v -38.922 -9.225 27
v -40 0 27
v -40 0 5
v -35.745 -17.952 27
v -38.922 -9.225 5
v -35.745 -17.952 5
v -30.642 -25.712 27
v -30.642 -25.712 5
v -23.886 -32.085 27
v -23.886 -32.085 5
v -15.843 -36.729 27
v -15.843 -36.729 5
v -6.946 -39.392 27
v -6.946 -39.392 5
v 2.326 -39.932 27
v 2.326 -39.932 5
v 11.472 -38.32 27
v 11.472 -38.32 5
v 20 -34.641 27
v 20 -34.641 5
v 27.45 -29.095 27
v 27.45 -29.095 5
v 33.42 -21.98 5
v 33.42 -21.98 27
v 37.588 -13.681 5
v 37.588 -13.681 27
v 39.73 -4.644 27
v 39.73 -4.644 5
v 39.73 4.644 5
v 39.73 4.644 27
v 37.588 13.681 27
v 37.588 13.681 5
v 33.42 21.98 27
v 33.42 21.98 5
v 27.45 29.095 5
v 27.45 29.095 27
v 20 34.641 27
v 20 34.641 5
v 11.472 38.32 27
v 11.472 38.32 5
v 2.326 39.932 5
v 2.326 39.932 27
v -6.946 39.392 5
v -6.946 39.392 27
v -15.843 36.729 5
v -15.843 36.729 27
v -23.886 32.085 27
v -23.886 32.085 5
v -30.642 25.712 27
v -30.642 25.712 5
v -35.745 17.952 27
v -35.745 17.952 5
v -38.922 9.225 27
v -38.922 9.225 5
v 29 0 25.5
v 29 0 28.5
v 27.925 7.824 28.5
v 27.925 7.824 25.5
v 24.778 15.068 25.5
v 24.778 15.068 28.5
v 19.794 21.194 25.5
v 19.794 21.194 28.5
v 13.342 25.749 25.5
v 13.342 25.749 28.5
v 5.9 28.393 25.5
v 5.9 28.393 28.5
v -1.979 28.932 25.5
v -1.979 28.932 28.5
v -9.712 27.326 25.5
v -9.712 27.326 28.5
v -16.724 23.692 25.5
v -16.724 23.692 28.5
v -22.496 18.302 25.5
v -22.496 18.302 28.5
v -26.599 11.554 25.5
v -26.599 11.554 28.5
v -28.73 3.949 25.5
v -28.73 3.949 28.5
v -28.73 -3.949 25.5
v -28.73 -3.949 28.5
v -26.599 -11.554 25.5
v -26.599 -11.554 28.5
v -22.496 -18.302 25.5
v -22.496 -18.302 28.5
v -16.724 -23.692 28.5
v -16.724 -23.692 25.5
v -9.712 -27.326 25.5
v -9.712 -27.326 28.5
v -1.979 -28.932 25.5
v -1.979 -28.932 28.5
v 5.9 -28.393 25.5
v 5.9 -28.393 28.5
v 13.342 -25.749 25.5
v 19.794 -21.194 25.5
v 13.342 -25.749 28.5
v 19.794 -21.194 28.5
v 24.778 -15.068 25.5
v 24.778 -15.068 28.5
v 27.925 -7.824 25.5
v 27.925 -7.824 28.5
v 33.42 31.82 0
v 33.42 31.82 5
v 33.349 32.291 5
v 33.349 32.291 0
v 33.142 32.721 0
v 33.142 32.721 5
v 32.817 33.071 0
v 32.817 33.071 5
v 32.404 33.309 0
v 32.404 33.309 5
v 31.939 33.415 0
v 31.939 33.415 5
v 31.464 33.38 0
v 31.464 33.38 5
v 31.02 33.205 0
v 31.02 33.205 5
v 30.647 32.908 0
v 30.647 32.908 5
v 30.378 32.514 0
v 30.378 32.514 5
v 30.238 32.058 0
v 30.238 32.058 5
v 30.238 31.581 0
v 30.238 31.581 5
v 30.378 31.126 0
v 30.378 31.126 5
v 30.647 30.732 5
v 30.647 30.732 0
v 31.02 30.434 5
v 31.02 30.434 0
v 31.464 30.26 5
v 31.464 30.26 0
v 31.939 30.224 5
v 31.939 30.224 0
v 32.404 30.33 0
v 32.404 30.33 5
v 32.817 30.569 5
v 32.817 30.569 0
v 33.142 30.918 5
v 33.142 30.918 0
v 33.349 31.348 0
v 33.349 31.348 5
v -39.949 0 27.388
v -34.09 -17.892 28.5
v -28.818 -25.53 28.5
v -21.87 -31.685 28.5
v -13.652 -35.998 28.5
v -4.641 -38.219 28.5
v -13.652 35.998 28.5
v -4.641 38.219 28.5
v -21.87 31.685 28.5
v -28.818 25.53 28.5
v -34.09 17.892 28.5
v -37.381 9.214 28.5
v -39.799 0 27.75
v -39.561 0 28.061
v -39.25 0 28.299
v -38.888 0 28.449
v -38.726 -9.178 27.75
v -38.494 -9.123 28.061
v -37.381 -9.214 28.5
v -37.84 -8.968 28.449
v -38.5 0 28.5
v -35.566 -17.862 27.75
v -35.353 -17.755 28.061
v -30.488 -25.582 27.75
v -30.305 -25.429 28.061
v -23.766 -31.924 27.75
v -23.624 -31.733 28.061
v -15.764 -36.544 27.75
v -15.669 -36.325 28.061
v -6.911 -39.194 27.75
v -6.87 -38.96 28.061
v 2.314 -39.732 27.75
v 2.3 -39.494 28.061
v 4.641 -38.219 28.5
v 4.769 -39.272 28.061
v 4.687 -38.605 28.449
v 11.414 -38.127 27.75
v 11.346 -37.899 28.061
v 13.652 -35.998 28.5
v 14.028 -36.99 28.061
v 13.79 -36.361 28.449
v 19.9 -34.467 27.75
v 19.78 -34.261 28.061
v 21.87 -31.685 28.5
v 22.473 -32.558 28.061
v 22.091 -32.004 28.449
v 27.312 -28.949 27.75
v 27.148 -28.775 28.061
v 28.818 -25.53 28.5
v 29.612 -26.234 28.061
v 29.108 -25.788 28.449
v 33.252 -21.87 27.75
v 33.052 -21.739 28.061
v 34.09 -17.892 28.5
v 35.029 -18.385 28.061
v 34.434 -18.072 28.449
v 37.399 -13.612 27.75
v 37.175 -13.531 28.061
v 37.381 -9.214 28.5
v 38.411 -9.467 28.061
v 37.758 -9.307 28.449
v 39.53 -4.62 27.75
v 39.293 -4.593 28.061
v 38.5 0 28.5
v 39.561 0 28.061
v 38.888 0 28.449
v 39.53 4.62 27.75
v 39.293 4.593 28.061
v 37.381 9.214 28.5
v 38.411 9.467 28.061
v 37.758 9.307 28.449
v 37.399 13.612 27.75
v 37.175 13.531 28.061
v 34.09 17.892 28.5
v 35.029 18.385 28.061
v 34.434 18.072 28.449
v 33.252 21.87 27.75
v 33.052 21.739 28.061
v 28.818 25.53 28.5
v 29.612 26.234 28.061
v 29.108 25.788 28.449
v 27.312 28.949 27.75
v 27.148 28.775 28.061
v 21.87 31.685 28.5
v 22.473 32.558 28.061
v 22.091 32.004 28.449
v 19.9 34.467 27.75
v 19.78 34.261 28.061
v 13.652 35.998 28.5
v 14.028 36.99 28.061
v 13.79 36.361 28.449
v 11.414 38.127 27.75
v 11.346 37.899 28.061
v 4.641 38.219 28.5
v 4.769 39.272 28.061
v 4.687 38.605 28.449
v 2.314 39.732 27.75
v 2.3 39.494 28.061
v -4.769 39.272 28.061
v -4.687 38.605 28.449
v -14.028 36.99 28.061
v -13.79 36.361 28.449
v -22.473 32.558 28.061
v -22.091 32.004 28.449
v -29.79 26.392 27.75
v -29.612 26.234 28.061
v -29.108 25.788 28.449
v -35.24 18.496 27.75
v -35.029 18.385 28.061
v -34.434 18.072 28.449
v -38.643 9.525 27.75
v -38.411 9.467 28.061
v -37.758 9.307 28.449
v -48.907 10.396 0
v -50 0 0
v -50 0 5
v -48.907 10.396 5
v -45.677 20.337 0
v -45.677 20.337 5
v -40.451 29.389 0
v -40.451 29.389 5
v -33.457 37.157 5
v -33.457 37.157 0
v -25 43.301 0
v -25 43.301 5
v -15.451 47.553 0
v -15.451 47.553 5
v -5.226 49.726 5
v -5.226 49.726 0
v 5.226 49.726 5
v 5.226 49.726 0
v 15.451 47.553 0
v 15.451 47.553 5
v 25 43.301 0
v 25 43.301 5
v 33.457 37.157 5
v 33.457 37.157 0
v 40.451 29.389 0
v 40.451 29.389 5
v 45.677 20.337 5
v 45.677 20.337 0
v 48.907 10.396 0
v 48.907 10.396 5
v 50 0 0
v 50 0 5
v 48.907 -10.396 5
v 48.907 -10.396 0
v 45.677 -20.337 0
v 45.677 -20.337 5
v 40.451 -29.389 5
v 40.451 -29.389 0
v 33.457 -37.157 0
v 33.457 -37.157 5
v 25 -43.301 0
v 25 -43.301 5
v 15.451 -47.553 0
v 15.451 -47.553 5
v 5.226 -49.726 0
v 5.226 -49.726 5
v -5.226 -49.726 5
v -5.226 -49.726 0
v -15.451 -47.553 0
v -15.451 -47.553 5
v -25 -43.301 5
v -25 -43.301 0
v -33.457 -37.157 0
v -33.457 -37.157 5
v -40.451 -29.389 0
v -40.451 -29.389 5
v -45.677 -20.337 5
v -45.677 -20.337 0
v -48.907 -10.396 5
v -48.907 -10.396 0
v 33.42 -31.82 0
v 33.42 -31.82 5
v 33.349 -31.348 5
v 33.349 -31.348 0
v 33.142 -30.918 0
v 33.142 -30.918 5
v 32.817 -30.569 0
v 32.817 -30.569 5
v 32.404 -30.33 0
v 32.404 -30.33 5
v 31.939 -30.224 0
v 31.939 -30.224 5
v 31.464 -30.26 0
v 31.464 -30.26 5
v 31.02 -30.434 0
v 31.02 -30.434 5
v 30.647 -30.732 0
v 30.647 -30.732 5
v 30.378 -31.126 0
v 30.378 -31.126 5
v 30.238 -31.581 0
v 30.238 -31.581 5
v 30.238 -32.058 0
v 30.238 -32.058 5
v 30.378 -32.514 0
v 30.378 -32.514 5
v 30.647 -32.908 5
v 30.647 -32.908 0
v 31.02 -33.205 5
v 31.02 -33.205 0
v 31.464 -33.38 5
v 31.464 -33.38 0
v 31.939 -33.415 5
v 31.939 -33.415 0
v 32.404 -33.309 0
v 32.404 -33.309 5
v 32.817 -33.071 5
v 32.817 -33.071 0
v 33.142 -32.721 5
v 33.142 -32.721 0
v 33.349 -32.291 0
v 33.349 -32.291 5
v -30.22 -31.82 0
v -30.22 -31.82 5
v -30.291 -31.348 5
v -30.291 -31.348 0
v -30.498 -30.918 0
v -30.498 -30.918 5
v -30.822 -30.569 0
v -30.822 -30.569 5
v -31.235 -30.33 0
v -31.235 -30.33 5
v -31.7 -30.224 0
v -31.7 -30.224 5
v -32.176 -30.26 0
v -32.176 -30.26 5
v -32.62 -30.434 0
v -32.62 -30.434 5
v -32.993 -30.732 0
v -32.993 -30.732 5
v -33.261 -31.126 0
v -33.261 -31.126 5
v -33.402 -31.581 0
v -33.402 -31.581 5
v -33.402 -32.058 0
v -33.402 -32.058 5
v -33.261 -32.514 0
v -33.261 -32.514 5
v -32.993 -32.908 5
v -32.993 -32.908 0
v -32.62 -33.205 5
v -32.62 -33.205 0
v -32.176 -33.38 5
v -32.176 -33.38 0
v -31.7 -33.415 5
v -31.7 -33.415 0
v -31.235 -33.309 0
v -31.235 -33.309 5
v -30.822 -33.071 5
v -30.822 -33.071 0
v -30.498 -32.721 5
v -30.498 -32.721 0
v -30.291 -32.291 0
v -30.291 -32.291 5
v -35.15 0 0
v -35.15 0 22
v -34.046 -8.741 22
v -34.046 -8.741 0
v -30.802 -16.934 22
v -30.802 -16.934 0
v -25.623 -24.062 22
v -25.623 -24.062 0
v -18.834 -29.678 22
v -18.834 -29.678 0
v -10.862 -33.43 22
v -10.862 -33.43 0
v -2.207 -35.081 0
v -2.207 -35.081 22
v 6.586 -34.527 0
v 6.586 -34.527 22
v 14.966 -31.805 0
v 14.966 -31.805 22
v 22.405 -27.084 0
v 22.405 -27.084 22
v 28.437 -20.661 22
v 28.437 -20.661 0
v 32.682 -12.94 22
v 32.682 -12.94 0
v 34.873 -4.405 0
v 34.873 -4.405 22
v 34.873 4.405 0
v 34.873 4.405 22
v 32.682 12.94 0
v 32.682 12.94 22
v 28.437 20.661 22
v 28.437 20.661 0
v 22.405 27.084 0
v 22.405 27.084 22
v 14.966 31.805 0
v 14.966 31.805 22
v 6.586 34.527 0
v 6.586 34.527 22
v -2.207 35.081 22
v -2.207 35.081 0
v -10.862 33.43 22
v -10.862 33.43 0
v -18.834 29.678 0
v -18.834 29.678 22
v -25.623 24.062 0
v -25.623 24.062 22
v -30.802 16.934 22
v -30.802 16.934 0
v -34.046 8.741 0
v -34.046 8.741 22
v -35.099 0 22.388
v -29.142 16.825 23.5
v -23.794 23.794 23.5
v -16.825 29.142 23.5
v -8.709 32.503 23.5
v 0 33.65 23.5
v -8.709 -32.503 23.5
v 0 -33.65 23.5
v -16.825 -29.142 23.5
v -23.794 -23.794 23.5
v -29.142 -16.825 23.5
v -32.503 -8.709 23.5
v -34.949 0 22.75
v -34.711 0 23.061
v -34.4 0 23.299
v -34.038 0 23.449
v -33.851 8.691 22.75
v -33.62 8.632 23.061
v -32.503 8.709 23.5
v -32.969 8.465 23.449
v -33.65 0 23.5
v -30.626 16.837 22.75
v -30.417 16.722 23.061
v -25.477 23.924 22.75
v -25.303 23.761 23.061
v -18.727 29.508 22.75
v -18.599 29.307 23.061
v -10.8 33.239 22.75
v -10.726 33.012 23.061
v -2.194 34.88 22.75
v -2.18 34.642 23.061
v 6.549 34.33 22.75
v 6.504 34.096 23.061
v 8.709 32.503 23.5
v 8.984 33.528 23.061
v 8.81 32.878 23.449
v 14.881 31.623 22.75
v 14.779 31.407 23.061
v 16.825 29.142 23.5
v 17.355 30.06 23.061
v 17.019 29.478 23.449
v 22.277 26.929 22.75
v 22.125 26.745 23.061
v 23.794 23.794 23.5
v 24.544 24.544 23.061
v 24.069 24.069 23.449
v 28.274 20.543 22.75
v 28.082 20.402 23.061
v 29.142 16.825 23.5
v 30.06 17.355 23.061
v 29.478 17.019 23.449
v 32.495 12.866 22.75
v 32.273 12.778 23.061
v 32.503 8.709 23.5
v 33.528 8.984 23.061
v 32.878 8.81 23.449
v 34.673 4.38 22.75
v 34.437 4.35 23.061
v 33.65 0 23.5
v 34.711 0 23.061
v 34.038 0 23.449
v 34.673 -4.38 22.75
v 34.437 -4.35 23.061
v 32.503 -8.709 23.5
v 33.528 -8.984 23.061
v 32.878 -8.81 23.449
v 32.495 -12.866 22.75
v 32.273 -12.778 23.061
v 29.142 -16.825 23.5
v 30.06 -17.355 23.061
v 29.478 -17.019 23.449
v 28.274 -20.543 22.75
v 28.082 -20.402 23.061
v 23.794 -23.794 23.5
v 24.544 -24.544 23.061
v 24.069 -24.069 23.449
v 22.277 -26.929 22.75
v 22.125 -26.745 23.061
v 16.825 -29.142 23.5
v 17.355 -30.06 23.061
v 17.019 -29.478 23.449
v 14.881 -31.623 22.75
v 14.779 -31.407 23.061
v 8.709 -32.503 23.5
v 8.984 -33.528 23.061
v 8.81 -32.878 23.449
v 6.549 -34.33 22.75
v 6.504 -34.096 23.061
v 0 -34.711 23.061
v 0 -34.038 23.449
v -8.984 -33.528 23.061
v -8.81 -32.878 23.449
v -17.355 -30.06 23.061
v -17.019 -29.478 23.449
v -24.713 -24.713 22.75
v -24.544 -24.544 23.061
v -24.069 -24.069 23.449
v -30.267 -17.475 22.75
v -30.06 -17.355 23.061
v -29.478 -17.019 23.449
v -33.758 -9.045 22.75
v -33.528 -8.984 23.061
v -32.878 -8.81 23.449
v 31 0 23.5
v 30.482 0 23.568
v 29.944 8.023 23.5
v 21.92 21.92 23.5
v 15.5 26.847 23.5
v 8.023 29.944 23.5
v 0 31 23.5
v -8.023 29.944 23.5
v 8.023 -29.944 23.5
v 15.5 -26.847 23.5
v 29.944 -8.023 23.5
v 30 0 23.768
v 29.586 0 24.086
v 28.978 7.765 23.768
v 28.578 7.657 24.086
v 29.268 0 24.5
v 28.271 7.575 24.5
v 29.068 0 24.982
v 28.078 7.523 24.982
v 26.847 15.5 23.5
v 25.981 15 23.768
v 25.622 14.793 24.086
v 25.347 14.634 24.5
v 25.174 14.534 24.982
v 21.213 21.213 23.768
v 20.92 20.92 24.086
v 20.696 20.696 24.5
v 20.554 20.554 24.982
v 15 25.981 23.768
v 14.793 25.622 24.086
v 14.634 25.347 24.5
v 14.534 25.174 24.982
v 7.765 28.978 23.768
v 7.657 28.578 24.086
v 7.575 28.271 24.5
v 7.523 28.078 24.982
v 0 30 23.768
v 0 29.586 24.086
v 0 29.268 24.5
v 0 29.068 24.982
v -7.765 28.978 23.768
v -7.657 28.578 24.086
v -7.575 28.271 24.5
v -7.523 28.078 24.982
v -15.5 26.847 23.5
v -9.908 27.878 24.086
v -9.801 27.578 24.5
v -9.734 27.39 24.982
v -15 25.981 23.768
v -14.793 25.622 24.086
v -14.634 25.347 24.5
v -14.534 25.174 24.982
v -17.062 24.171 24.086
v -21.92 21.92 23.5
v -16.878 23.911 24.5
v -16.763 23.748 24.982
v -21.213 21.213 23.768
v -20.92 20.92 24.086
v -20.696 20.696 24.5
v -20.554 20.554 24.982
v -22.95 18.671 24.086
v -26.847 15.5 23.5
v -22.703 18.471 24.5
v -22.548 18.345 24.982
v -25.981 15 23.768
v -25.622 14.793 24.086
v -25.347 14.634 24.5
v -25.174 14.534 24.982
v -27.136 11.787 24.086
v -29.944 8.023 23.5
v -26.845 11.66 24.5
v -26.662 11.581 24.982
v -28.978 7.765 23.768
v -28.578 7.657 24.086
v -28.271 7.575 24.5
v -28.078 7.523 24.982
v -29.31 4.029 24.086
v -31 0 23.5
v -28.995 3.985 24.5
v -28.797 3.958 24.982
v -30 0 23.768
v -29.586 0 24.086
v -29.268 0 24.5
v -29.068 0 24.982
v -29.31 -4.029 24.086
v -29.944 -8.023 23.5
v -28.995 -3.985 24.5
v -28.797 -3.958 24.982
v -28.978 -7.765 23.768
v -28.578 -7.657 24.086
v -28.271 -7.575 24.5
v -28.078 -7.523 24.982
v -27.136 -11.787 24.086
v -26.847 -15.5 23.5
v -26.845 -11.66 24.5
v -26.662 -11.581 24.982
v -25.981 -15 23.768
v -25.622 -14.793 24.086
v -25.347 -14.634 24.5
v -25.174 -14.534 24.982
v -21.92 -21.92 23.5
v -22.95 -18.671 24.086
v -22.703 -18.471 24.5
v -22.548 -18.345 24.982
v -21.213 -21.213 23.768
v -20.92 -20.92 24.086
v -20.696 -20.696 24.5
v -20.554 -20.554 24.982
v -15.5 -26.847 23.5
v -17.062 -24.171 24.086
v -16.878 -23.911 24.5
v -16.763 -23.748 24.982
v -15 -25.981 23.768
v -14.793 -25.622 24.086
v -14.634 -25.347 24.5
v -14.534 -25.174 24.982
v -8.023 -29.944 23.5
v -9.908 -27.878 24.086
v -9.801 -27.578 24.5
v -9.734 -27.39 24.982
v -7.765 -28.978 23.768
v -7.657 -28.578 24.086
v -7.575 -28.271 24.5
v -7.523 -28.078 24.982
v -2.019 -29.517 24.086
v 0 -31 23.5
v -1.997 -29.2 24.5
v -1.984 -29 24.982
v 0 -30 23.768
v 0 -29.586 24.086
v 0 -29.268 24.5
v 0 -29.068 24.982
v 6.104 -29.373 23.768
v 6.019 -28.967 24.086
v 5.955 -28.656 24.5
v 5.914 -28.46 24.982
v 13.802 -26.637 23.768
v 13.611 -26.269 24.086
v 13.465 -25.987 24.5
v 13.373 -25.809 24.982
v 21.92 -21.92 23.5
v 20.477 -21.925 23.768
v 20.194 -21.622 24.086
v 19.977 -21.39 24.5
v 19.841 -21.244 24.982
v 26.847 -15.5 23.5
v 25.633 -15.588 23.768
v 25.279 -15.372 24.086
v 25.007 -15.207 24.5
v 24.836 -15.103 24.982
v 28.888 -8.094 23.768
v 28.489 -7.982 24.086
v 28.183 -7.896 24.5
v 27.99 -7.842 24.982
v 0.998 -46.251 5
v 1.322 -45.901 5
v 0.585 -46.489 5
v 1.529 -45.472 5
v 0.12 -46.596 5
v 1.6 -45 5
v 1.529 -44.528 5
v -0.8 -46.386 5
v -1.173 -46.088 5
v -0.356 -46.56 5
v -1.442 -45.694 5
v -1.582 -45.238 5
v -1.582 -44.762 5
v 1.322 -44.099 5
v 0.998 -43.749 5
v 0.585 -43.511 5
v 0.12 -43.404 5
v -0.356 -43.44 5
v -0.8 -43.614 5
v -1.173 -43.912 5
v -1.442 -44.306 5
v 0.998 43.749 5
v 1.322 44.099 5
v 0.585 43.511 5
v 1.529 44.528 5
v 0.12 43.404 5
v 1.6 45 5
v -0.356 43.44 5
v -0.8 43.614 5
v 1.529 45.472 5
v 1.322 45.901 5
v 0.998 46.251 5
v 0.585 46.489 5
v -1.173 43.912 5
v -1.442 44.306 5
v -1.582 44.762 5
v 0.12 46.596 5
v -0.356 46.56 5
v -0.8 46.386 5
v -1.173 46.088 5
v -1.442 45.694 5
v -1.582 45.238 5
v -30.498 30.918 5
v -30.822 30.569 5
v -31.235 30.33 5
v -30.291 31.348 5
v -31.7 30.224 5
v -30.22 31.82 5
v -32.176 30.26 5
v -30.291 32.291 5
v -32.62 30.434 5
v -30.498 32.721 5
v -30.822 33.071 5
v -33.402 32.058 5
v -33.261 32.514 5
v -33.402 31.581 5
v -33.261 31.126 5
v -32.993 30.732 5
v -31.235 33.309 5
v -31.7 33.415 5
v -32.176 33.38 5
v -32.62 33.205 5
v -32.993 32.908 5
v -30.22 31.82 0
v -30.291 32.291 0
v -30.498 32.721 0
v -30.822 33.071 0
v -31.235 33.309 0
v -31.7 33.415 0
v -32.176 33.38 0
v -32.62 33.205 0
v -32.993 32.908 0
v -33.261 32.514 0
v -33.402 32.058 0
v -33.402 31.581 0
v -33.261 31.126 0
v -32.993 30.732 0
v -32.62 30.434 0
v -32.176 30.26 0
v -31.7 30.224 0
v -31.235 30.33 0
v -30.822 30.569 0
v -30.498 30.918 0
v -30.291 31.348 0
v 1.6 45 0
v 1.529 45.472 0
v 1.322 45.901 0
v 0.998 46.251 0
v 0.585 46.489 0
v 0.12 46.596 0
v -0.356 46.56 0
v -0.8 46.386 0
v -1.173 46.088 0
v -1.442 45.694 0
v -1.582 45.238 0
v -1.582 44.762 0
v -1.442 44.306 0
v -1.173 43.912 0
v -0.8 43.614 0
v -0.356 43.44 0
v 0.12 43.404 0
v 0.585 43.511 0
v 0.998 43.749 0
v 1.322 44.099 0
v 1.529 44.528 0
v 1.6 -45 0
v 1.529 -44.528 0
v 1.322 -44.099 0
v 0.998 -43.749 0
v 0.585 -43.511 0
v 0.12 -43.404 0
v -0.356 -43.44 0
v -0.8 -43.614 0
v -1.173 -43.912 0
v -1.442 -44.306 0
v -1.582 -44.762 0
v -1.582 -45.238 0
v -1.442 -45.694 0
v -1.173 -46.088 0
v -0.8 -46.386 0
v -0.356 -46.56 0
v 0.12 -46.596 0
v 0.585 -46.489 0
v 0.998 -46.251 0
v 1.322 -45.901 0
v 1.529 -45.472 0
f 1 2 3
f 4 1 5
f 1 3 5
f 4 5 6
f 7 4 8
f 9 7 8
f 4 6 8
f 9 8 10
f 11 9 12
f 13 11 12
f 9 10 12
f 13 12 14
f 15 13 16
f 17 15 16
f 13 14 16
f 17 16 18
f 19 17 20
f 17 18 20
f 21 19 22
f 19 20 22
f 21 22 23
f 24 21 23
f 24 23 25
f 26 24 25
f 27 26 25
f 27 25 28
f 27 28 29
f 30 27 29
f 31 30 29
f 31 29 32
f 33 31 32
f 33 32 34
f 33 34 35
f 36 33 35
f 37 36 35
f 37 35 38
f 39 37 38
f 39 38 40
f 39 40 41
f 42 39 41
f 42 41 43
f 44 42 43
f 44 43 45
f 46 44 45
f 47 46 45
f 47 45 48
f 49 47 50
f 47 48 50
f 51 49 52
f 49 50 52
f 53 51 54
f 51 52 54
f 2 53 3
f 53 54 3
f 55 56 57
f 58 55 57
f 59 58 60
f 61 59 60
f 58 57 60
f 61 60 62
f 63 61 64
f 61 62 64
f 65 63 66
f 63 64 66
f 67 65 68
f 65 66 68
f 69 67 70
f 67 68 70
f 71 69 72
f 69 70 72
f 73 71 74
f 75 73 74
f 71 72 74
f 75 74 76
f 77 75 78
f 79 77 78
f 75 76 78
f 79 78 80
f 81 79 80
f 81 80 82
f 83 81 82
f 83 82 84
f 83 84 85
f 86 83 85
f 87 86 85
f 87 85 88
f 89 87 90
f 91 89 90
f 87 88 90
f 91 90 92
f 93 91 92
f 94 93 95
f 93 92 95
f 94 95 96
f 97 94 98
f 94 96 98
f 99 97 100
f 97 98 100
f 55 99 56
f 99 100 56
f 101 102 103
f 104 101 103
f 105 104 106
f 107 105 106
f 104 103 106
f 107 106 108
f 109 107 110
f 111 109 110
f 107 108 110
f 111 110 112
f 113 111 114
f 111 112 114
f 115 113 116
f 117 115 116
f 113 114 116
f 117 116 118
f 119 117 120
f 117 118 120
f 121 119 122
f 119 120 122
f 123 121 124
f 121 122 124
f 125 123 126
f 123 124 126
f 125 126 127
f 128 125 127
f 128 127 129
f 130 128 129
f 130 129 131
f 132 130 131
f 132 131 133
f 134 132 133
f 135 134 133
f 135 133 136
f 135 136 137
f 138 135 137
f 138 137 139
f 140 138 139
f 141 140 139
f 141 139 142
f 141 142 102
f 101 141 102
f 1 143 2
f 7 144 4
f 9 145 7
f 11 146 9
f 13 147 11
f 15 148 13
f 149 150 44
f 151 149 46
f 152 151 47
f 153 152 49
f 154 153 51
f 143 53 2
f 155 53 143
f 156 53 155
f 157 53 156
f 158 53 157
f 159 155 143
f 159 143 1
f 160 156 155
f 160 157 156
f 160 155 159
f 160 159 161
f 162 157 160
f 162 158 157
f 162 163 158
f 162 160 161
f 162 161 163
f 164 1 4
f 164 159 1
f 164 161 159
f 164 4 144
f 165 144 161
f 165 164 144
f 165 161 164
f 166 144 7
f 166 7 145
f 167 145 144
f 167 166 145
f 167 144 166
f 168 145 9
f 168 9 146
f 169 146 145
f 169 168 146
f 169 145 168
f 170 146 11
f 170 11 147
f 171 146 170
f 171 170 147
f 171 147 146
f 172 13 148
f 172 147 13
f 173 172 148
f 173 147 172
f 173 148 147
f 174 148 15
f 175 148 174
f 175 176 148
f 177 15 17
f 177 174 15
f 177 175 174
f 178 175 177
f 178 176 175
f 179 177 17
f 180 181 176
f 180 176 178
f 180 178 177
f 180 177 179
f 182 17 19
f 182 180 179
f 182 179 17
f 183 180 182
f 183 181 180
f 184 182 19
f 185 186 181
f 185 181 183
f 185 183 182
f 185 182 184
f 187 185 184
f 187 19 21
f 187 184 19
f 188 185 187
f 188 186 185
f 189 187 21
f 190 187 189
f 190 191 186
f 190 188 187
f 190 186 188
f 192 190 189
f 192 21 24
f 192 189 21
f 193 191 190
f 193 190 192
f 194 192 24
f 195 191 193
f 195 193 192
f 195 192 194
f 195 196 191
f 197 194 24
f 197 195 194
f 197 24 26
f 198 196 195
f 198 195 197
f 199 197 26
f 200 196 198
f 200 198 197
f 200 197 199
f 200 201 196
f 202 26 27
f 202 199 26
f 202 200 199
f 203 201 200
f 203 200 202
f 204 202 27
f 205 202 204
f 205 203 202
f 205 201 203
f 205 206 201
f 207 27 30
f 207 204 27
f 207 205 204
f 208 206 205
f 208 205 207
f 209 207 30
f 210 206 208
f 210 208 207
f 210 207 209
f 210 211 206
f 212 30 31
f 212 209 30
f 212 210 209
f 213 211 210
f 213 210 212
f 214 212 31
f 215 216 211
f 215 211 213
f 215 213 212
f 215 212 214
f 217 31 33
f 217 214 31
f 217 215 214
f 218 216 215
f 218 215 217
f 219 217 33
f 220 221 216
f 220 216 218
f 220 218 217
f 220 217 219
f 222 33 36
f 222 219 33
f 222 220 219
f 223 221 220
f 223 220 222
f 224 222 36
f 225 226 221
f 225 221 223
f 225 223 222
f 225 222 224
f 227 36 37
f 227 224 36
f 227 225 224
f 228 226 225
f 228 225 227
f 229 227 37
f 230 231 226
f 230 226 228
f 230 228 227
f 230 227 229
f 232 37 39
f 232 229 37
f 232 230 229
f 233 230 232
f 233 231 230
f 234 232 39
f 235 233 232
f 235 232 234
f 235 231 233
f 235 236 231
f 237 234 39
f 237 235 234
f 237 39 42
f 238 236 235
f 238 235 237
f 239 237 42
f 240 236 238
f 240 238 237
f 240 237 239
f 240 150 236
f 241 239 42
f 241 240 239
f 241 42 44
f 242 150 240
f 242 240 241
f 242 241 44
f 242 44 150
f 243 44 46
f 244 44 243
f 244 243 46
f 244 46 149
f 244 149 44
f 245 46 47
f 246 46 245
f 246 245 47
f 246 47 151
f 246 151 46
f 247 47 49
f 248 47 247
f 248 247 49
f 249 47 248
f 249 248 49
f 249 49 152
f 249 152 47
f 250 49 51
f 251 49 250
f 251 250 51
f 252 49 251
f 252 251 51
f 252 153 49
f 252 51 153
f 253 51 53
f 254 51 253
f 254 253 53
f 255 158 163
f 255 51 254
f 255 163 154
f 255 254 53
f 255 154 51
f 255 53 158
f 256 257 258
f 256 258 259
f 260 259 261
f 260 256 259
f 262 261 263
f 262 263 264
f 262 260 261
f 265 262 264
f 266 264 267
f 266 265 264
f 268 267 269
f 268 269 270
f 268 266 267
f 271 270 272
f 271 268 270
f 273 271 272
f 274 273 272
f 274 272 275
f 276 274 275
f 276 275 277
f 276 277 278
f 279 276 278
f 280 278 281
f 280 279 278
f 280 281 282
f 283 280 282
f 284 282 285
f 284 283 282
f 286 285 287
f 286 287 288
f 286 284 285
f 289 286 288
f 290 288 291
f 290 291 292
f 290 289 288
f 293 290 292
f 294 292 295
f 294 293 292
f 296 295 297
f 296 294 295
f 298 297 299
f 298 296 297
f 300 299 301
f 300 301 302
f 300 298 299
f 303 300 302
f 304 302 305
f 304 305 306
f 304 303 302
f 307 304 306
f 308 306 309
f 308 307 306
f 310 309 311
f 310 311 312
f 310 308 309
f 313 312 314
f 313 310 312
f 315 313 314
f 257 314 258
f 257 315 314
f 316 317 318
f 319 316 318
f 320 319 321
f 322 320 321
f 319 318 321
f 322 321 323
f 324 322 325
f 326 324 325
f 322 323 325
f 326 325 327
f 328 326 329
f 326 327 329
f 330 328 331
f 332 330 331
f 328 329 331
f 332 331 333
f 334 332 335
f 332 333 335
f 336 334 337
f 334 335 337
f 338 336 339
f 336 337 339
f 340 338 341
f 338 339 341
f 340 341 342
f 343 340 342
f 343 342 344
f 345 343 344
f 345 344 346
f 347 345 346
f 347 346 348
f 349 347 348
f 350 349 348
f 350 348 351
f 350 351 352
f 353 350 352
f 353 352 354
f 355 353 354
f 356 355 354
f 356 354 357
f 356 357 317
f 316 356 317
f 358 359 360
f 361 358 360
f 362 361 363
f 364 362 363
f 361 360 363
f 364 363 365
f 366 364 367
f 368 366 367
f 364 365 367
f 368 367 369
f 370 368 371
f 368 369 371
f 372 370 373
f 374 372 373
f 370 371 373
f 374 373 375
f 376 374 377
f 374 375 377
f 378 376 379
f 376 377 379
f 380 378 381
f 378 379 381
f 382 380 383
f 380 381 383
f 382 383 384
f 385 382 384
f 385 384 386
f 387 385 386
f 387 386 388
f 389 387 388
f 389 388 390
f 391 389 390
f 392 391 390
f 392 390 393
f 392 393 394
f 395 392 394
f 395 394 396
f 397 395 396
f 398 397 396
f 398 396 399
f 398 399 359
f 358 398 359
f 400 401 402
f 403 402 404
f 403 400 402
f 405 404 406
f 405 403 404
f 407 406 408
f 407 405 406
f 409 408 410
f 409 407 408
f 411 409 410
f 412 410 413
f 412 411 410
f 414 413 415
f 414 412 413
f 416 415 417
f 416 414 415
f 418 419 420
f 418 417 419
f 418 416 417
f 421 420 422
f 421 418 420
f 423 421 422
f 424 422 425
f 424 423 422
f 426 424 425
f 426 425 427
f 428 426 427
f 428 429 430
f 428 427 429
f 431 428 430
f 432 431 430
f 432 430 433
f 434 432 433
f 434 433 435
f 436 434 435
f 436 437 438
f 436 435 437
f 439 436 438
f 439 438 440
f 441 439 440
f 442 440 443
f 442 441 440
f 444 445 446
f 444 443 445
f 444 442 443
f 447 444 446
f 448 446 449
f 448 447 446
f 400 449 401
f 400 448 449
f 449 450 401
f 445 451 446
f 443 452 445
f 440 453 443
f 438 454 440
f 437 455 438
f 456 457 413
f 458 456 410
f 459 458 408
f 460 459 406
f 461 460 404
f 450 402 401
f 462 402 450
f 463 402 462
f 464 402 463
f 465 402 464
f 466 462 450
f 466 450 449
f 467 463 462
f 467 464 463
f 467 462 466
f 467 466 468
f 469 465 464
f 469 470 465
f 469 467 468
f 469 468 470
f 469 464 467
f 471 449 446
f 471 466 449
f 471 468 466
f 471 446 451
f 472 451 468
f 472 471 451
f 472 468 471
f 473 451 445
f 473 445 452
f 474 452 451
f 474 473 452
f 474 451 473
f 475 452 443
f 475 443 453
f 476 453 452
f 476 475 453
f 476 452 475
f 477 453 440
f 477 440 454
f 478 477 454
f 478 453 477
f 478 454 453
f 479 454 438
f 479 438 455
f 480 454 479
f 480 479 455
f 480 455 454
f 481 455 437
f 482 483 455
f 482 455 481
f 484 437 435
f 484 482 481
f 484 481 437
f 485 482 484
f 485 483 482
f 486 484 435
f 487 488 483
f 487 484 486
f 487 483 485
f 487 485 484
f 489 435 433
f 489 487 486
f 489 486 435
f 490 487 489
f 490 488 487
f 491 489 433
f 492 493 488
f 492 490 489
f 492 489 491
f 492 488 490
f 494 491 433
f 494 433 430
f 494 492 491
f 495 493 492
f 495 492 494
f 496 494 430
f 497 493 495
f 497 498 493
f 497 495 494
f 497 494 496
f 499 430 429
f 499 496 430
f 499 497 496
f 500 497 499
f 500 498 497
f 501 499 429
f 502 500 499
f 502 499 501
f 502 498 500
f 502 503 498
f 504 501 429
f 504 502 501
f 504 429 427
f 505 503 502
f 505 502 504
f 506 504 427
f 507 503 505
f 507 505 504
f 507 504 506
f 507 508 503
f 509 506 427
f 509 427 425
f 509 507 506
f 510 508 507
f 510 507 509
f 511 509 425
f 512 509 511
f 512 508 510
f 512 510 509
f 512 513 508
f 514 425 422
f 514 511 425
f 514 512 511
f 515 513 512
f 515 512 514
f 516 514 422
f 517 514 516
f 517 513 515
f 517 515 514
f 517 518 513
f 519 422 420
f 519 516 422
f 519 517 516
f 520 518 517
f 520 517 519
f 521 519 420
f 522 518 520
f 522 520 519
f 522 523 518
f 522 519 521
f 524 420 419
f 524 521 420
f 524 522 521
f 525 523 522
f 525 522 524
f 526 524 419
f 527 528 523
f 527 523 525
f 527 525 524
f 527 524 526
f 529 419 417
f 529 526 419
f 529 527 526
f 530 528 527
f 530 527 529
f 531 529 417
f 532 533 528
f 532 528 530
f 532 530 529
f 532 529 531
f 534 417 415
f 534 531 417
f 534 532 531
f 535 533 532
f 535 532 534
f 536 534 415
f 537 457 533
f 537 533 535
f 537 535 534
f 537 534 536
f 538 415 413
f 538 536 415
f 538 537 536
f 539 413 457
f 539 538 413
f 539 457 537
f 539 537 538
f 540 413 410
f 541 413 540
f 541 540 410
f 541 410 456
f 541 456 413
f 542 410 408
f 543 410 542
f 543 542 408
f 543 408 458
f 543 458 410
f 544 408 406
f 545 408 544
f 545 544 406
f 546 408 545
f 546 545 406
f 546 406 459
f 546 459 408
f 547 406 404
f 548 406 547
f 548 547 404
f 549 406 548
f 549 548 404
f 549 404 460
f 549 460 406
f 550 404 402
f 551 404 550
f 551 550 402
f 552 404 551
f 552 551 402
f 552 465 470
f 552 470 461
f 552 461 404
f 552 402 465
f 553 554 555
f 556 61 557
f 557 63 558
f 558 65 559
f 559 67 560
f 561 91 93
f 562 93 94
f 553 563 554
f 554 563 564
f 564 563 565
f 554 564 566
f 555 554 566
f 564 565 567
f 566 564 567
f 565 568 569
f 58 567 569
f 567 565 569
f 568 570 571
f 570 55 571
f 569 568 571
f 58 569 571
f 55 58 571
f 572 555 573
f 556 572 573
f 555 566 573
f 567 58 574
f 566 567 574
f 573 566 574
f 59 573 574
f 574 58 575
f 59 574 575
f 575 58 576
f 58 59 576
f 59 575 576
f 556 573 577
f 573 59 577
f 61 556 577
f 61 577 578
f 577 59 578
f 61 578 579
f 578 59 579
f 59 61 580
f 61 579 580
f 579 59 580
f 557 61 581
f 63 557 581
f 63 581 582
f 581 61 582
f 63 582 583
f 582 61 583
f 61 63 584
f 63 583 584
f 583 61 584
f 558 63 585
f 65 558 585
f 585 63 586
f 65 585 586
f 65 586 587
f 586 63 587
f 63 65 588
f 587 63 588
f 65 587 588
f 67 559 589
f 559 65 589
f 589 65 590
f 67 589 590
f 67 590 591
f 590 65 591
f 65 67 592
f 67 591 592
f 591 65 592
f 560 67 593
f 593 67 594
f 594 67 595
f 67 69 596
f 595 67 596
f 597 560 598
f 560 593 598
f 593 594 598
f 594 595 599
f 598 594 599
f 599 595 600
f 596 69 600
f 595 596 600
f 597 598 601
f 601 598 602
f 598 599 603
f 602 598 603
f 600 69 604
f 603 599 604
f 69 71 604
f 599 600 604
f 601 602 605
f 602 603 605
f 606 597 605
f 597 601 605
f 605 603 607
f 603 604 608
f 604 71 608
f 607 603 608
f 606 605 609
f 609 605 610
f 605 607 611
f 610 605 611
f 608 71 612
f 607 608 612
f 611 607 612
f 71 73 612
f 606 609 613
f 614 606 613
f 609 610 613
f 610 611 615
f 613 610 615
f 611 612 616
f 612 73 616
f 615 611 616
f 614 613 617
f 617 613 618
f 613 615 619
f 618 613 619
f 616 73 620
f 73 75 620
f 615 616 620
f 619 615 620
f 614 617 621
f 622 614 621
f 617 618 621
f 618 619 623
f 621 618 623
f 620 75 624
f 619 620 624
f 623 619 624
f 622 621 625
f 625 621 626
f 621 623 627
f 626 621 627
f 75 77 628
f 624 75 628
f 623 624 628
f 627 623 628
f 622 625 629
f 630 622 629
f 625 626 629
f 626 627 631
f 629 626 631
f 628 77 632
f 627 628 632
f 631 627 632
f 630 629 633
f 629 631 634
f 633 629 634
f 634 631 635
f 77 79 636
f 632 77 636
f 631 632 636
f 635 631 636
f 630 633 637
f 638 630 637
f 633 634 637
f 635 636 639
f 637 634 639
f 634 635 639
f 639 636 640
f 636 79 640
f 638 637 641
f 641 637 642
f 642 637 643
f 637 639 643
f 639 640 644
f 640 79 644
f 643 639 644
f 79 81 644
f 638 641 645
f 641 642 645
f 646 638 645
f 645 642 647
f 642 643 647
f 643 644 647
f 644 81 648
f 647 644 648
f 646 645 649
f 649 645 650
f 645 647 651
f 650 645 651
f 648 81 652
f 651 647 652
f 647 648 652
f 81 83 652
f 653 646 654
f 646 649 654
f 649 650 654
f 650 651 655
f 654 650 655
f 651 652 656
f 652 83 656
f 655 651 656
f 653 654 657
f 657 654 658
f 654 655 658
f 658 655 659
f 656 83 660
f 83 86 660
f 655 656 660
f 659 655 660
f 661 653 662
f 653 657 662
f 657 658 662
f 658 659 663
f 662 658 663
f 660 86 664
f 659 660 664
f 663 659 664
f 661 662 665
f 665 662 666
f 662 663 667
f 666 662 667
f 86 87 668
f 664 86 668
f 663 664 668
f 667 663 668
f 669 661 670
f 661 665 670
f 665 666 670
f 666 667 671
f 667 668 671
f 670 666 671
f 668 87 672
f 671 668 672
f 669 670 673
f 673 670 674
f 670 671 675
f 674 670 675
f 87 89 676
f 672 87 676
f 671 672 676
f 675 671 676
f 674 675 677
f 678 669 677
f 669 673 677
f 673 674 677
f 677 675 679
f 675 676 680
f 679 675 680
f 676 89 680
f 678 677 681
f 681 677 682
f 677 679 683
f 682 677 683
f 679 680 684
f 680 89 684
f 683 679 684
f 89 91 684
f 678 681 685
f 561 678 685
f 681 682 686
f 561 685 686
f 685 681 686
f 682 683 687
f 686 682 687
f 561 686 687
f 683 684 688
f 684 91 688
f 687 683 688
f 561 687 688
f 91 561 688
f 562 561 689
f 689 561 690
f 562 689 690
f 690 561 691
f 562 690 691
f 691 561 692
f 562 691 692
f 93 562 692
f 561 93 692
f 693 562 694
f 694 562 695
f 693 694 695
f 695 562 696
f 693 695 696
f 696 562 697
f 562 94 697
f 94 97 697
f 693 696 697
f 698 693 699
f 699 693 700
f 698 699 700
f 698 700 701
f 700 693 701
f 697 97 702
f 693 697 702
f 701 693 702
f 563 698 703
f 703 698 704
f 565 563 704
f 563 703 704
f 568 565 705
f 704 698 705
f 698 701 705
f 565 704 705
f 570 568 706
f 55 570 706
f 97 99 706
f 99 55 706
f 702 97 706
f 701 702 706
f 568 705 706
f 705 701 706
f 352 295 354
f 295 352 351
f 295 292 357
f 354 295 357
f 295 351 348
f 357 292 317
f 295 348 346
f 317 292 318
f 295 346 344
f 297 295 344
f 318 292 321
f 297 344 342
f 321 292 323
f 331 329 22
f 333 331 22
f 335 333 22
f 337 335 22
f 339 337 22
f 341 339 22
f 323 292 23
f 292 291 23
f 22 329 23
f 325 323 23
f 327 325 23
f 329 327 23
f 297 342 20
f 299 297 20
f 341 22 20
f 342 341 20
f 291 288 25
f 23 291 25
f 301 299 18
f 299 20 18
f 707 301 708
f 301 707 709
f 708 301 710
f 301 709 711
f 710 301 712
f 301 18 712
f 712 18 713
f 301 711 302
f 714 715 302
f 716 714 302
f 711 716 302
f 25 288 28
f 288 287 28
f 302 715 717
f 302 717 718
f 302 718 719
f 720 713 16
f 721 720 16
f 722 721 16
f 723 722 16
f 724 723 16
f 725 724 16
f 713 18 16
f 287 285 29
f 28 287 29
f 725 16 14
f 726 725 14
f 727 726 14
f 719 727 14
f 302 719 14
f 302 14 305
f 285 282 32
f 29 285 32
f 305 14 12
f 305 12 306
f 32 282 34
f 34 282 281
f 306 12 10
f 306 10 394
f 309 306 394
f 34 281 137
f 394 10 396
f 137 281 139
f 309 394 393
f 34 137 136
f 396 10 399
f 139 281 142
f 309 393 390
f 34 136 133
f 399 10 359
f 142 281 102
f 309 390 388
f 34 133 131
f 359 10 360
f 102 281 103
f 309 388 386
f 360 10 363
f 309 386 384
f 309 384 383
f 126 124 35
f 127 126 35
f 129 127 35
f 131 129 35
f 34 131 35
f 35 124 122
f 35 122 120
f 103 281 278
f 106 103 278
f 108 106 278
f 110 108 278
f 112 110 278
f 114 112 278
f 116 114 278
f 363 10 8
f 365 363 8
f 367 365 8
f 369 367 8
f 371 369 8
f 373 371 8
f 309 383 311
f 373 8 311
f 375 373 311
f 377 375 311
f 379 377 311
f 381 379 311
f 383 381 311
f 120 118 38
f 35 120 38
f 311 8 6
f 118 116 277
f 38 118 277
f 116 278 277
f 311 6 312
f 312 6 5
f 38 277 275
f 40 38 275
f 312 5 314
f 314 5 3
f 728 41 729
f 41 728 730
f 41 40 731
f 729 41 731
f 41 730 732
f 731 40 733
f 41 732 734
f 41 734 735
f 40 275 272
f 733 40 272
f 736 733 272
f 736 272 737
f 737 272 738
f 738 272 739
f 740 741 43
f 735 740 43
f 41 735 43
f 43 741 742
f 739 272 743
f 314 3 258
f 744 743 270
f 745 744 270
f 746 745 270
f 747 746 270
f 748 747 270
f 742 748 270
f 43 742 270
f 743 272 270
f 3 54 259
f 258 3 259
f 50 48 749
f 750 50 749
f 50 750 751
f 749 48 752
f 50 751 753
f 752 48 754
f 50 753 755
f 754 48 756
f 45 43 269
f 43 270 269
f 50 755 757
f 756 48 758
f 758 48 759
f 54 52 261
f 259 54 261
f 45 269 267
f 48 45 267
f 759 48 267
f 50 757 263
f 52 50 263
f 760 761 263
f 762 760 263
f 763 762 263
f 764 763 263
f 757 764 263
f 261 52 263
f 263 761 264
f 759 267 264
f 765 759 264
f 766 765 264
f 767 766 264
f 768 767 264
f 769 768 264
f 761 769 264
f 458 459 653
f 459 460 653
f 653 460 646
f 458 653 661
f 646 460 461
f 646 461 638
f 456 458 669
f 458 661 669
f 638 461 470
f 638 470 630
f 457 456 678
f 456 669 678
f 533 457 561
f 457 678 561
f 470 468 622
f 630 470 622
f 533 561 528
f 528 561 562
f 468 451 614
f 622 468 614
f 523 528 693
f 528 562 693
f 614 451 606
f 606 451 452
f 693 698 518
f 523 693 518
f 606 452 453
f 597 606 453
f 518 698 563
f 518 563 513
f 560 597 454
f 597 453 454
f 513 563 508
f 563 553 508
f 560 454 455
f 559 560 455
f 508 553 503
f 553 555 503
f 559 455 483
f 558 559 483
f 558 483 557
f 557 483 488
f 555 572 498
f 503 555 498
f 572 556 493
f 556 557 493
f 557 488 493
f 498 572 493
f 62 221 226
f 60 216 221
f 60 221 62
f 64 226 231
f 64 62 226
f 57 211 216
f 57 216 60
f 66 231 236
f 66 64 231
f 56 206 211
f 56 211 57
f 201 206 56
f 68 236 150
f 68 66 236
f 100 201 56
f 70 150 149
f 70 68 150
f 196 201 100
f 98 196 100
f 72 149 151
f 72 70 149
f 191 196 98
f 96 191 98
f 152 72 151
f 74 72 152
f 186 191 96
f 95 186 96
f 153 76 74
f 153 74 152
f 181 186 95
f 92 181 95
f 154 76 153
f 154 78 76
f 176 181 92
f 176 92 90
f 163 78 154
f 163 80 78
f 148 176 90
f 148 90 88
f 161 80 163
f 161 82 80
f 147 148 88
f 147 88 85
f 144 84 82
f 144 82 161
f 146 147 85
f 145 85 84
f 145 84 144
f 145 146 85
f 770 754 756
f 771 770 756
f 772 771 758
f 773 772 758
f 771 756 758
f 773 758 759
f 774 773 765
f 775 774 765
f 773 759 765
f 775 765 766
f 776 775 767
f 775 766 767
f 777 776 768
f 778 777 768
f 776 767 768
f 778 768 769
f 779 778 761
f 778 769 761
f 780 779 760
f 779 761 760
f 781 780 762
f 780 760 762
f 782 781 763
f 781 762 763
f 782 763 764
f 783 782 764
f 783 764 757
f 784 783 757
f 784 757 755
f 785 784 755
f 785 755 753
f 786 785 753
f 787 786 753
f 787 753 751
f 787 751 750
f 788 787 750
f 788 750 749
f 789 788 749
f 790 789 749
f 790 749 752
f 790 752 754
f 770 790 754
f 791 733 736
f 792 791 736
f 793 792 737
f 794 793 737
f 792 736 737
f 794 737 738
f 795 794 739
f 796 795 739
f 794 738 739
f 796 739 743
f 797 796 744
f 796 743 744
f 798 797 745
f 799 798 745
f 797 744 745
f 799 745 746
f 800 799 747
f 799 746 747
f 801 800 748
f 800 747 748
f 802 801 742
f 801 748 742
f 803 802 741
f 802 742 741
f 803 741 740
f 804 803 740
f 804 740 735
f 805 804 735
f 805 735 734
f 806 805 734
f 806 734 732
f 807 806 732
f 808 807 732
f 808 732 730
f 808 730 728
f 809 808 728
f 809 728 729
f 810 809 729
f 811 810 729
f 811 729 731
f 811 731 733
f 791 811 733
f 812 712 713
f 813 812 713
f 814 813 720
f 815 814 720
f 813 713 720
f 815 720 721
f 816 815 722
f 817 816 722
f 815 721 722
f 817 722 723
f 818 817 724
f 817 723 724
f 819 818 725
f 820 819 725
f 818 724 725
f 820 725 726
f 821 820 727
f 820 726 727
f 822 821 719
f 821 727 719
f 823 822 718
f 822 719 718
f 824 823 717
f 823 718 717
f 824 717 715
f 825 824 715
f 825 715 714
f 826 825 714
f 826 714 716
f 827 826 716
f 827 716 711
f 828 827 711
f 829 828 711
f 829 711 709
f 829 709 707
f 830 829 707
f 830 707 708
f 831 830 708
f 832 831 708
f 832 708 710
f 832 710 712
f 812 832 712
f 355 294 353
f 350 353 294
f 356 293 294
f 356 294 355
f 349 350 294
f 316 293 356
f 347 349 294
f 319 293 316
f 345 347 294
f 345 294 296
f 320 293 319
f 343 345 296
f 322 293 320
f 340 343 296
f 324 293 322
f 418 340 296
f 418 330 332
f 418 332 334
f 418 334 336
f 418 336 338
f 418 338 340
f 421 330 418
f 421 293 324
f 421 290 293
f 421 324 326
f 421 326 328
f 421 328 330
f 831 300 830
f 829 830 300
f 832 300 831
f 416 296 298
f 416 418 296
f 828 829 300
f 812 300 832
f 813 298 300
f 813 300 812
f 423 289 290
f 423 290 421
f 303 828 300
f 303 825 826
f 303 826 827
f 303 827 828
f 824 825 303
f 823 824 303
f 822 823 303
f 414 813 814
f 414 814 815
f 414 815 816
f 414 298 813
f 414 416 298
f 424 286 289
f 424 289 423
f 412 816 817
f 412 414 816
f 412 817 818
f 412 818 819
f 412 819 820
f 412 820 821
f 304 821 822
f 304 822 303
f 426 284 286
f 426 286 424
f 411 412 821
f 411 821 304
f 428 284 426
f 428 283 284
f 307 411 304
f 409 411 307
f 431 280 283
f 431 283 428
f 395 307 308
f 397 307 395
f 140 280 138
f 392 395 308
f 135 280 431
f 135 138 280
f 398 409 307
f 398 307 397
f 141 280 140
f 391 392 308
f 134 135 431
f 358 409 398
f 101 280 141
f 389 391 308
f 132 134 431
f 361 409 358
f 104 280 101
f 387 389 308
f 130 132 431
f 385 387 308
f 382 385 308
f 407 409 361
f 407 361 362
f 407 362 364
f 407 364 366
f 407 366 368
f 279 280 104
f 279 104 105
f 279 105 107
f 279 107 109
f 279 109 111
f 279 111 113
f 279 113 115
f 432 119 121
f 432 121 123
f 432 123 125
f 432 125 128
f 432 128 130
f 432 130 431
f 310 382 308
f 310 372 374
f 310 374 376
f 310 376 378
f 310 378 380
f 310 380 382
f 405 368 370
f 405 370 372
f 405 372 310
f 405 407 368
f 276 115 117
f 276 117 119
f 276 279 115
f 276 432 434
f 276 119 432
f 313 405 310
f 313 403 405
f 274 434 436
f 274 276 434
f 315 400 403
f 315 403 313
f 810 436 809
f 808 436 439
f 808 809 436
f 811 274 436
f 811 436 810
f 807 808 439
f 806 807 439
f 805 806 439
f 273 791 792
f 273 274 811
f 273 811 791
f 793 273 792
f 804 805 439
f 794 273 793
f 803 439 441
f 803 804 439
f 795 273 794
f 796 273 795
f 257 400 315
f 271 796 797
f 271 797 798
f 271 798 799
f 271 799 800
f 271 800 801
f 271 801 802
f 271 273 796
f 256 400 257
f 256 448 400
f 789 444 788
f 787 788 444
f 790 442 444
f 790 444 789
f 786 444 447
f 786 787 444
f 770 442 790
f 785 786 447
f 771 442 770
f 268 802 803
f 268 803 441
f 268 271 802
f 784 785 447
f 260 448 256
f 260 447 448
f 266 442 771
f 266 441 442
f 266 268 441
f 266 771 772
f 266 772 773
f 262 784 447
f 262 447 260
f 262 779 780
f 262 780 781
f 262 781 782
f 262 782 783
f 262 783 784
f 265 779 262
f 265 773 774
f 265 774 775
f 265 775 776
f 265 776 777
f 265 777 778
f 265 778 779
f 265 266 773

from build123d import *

# Parameters (mm, degrees)
SKETCH_1_R          = 40
SKETCH_1_R_2        = 35.15
EXTRUDE_1_DEPTH     = 28.5
SKETCH_2_R          = 35.5
SKETCH_2_R_2        = 29
EXTRUDE_2_DEPTH     = 5
SKETCH_3_R          = 50
SKETCH_3_R_2        = 40
EXTRUDE_3_DEPTH     = 5
SKETCH_4_R          = 1.6
CUT_EXTRUDE_1_DEPTH = 75.51342161
FILLET_1_R          = 1.5
FILLET_2_R          = 2


with BuildPart() as part:
    # 草图1 → 凸台-拉伸1 (new body)
    with BuildSketch(Plane.XY):
        with Locations(Location((0, 0, 0), (0, 0, 180))):
            Circle(SKETCH_1_R)
        with Locations(Location((0, 0, 0), (0, 0, 180))):
            Circle(SKETCH_1_R_2, mode=Mode.SUBTRACT)
    extrude(amount=EXTRUDE_1_DEPTH)

    # 草图2 → 凸台-拉伸2 (add)
    with BuildSketch(Plane.XY.offset(28.5)):
        Circle(SKETCH_2_R)
        Circle(SKETCH_2_R_2, mode=Mode.SUBTRACT)
    extrude(amount=-EXTRUDE_2_DEPTH)

    # 草图3 → 凸台-拉伸3 (add)
    with BuildSketch(Plane(origin=(0, 0, 0), x_dir=(-1, 0, 0), z_dir=(0, 0, -1))):
        Circle(SKETCH_3_R)
        Circle(SKETCH_3_R_2, mode=Mode.SUBTRACT)
    extrude(amount=-EXTRUDE_3_DEPTH)

    # 草图4 → 切除-拉伸1 (cut, through all)
    with BuildSketch(Plane.XY.offset(5)):
        with Locations((31.819805153, 31.819805153)):
            Circle(SKETCH_4_R)
        with Locations((31.819805153, -31.819805153)):
            Circle(SKETCH_4_R)
        with Locations((-31.819805153, -31.819805153)):
            Circle(SKETCH_4_R)
        with Locations((-31.819805153, 31.819805153)):
            Circle(SKETCH_4_R)
        with Locations((0, 45)):
            Circle(SKETCH_4_R)
        with Locations((0, -45)):
            Circle(SKETCH_4_R)
    extrude(amount=-CUT_EXTRUDE_1_DEPTH, mode=Mode.SUBTRACT)

    # 圆角1
    fillet_1_edges = [part.edges().sort_by_distance(p)[0] for p in [
        (35.15, 0, 23.5),
        (40, 0, 28.5),
    ]]
    fillet(fillet_1_edges, radius=FILLET_1_R)

    # 圆角2
    fillet_2_edges = [part.edges().sort_by_distance(p)[0] for p in [
        (-29, 0, 23.5),
    ]]
    fillet(fillet_2_edges, radius=FILLET_2_R)


solid = part.part
